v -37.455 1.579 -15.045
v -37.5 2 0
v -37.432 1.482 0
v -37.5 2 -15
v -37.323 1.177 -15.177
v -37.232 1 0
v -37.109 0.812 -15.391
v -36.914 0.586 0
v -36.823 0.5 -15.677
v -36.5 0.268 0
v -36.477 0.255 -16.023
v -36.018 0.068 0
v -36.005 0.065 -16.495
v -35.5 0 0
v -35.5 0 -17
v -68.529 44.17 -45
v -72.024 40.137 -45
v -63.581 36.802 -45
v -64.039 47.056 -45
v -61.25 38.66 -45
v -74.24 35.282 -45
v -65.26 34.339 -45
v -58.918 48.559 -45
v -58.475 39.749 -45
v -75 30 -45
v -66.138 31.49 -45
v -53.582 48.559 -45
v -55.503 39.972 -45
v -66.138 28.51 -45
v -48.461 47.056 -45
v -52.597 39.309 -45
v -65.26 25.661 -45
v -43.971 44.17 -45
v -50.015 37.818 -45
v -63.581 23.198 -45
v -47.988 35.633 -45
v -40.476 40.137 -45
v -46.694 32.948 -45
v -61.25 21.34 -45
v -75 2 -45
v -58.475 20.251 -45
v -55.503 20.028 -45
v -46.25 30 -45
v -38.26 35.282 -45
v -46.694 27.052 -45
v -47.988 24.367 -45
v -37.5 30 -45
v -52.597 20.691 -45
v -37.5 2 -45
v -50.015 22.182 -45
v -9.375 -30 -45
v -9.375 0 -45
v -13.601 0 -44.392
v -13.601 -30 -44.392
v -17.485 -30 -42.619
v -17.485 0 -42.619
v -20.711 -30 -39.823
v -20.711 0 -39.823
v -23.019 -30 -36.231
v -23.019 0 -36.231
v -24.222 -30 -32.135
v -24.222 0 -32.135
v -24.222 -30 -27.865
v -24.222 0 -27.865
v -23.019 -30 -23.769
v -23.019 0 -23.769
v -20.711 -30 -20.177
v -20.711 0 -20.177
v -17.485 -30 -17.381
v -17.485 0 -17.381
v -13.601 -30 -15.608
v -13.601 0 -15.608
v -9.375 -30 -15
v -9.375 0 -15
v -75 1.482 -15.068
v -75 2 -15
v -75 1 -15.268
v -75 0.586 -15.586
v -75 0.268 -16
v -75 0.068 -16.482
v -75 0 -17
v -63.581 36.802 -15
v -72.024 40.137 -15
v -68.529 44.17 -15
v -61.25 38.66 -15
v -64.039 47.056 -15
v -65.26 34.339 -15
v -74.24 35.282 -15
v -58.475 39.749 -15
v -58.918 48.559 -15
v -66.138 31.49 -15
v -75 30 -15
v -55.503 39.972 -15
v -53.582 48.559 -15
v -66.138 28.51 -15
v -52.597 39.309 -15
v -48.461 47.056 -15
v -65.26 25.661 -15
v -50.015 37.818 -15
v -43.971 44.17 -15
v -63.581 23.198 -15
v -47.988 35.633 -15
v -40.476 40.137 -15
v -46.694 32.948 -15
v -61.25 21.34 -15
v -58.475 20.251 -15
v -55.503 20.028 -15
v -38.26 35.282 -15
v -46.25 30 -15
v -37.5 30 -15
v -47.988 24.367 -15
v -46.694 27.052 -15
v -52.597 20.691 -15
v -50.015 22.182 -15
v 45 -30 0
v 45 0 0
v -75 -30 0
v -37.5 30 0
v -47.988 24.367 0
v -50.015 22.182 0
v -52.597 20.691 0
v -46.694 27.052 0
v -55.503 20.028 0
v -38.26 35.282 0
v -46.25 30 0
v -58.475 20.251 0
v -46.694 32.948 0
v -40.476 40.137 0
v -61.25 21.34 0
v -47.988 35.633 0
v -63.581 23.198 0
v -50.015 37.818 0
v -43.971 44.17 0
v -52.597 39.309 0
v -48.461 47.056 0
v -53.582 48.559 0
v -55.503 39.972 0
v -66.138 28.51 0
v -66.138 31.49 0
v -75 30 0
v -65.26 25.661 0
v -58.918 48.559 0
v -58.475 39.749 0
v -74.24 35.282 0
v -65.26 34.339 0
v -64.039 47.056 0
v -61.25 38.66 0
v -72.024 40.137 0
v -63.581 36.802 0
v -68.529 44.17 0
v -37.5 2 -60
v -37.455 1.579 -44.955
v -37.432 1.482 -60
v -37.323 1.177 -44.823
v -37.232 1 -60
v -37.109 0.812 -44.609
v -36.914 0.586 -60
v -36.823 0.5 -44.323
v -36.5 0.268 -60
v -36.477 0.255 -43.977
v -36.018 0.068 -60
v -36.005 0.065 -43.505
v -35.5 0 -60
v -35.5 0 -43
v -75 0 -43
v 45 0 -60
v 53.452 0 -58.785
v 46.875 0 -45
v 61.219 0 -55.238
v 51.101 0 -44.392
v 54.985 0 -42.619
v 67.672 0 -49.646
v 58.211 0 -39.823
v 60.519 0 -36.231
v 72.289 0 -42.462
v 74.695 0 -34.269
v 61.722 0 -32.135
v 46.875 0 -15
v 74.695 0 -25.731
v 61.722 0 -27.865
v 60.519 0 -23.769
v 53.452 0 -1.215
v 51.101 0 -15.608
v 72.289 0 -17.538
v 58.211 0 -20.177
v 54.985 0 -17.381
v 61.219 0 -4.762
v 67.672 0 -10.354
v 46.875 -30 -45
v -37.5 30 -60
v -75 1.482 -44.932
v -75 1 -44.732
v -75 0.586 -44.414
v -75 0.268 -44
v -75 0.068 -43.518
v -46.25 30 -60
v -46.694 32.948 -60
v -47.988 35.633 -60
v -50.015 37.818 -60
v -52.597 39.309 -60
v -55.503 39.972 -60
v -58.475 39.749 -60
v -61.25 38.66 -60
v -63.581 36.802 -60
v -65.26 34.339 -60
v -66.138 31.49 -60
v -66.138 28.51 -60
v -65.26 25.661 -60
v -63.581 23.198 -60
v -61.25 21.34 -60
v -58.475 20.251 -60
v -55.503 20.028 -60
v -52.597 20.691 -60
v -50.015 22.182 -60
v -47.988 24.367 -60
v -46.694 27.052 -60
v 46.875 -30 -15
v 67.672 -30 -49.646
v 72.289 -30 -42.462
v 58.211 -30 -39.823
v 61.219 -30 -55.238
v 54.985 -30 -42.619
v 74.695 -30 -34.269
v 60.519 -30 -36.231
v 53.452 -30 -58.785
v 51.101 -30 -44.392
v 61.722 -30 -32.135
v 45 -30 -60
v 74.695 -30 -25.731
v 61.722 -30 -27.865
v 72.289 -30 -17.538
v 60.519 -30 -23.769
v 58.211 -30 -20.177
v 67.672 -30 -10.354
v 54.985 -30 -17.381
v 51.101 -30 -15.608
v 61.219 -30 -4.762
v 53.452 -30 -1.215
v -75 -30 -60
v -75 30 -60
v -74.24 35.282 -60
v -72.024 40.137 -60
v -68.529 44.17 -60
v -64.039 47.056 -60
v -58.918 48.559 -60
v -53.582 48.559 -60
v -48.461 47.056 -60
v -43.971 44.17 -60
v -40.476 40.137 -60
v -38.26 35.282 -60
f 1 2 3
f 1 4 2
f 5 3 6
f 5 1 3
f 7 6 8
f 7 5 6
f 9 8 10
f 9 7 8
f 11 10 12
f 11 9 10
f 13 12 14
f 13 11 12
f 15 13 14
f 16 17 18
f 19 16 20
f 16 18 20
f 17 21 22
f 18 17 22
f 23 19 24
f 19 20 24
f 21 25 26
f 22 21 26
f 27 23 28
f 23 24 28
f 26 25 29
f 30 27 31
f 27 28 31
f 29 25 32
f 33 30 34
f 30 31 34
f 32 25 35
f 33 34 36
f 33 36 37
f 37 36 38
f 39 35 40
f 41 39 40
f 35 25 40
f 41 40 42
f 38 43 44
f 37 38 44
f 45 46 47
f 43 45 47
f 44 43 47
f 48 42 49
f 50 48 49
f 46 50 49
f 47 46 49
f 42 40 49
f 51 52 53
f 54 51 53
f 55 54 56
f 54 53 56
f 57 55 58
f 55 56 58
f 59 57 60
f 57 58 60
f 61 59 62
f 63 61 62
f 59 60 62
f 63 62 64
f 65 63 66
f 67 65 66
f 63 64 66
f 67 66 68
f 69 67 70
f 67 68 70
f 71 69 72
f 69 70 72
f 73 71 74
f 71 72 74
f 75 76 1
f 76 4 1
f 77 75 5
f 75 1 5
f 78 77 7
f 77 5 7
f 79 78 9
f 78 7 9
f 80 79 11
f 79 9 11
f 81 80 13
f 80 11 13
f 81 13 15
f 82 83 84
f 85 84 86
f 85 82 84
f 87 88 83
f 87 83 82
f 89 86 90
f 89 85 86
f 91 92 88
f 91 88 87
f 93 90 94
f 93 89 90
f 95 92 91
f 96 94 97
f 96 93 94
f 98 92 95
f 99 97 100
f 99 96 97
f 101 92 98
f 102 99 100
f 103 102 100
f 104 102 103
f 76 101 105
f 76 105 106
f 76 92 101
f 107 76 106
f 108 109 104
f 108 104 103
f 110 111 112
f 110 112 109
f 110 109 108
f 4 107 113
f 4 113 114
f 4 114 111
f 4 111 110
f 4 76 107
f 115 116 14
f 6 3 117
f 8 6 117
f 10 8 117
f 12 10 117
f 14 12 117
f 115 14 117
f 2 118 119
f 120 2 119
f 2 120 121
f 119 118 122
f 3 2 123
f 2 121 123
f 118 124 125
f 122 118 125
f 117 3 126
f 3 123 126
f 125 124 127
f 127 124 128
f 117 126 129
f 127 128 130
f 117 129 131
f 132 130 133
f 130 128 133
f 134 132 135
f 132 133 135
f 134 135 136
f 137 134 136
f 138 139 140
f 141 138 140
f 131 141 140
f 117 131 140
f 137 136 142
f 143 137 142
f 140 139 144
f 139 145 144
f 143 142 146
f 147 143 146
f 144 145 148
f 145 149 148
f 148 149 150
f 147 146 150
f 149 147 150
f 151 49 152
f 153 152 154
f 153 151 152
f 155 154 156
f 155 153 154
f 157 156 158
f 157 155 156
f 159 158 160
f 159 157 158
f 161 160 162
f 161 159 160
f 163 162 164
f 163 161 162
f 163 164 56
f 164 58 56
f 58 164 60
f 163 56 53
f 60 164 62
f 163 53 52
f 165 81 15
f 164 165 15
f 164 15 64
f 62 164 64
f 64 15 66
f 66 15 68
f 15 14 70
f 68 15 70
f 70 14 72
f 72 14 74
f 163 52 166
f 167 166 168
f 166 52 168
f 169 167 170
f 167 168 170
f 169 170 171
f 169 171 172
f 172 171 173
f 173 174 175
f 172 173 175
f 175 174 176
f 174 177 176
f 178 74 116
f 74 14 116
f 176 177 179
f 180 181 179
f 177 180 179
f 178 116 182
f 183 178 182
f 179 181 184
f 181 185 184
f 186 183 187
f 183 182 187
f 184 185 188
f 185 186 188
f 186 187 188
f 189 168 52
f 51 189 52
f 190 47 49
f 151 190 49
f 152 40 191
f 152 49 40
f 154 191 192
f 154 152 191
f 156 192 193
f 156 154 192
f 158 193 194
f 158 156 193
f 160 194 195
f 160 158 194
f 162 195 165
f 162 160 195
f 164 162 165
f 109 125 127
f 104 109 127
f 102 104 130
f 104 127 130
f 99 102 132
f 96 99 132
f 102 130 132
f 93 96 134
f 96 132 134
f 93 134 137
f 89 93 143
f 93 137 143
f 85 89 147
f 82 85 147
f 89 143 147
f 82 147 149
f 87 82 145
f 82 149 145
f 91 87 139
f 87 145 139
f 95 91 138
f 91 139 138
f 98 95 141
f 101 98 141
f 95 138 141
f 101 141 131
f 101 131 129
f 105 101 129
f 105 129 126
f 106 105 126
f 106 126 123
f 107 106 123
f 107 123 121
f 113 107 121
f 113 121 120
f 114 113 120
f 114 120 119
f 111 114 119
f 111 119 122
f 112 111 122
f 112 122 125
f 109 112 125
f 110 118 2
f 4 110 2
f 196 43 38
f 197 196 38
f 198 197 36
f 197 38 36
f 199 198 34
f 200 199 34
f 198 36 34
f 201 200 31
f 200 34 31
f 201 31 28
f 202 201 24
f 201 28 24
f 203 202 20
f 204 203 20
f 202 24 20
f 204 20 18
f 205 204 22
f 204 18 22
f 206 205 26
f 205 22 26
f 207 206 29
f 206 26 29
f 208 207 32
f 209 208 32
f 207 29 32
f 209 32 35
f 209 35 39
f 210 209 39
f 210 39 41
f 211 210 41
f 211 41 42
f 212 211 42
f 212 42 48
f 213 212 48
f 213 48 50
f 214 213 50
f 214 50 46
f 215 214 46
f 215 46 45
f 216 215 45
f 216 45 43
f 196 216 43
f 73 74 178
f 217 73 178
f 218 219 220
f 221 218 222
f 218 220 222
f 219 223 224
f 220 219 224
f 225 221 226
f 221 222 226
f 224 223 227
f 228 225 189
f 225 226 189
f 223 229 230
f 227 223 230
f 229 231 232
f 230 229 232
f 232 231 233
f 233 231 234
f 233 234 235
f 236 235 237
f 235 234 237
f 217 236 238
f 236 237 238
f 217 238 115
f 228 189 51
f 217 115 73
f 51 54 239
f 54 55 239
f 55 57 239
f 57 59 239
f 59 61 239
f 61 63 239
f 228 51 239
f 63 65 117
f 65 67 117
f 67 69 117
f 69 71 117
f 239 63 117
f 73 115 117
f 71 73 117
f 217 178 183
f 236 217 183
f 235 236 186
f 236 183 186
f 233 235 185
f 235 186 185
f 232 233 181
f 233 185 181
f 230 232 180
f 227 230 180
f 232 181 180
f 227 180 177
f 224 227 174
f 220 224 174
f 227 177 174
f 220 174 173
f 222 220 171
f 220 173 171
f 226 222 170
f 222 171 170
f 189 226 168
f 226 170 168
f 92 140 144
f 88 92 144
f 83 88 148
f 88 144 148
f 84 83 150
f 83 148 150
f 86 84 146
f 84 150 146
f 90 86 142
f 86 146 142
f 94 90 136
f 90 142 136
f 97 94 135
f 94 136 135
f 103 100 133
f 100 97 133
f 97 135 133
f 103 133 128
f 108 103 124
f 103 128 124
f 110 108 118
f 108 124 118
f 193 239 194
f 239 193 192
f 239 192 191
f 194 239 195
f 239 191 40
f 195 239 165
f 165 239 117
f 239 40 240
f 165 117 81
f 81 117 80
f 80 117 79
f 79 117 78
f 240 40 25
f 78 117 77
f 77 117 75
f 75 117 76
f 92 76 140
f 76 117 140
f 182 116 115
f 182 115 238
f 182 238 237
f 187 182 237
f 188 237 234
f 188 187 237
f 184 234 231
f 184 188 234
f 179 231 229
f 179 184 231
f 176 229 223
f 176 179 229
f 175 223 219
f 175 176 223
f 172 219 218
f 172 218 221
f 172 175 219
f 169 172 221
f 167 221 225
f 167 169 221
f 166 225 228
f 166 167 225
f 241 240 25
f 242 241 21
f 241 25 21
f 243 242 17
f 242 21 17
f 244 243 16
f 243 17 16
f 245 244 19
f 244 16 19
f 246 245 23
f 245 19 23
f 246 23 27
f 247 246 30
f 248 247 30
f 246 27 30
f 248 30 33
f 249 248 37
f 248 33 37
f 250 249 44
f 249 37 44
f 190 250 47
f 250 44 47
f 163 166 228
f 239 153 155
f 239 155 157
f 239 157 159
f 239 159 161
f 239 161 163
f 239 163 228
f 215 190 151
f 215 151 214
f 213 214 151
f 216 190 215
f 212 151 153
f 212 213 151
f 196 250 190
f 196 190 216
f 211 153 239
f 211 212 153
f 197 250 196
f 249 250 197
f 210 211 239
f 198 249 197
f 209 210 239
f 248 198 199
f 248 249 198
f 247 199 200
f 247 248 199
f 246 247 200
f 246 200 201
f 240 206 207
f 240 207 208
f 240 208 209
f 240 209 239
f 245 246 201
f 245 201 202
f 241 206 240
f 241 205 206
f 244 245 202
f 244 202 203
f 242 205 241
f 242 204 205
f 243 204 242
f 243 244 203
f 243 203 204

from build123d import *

# Parameters (mm, degrees)
SKETCH1_R           = 10
BOSS_EXTRUDE1_DEPTH = 60
SKETCH3_W           = 37.5
SKETCH3_H           = 30
CUT_EXTRUDE1_DEPTH  = 108.710549623
CUT_EXTRUDE2_DEPTH  = 108.710549623
FILLET1_RADIUS      = 30
FILLET1_LENGTH      = 30
FILLET2_R           = 2


with BuildPart() as part:
    # Sketch1 → Boss-Extrude1 (new body)
    with BuildSketch(Plane.XY):
        with BuildLine():
            Line((75, 0), (75, -30))
            Line((75, -30), (-75, -30))
            Line((-75, -30), (-75, 30))
            ThreePointArc((-75, 30), (-56.25, 48.75), (-37.5, 30))
            Line((-37.5, 30), (-37.5, 0))
            Line((-37.5, 0), (75, 0))
        make_face()
        with Locations((-56.25, 30)):
            Circle(SKETCH1_R, mode=Mode.SUBTRACT)
    extrude(amount=-BOSS_EXTRUDE1_DEPTH)

    # Sketch3 → Cut-Extrude1 (cut, through all)
    with BuildSketch(Plane(origin=(0, 0, 0), x_dir=(1, 0, 0), z_dir=(0, 1, 0))):
        with Locations((-56.25, 30)):
            Rectangle(SKETCH3_W, SKETCH3_H)
    extrude(amount=CUT_EXTRUDE1_DEPTH, mode=Mode.SUBTRACT)

    # Sketch3<5> → Cut-Extrude2 (cut, through all)
    with BuildSketch(Plane(origin=(0, 0, 0), x_dir=(1, 0, 0), z_dir=(0, 1, 0))):
        with BuildLine():
            Line((46.875, 45), (-9.375, 45))
            ThreePointArc((-9.375, 45), (-24.375, 30), (-9.375, 15))
            Line((-9.375, 15), (46.875, 15))
            ThreePointArc((46.875, 15), (61.875, 30), (46.875, 45))
        make_face()
    extrude(amount=-CUT_EXTRUDE2_DEPTH, mode=Mode.SUBTRACT)

    # Fillet1: full round fillet: the end face becomes a half cylinder, R = half its width
    fillet1_face = Plane((75, -15, -30), x_dir=(0, 1, 0), z_dir=(1, 0, 0))  # on the end face: x along it, z out of the body
    fillet1_slab = fillet1_face.offset(-FILLET1_RADIUS / 2) * Box(FILLET1_LENGTH, 2 * FILLET1_RADIUS, FILLET1_RADIUS, mode=Mode.PRIVATE)  # the body's end, R deep
    fillet1_round = Plane((45, -15, -30), x_dir=(1, 0, 0), z_dir=(0, 1, 0)) * Cylinder(FILLET1_RADIUS, FILLET1_LENGTH, mode=Mode.PRIVATE)  # its axis R under the face
    add(fillet1_slab - fillet1_round, mode=Mode.SUBTRACT)

    # Fillet2
    fillet2_edges = [part.edges().sort_by_distance(p)[0] for p in [
        (-37.5, 0, -52.5),
        (-37.5, 0, -7.5),
        (-56.25, 0, -45),
        (-56.25, 0, -15),
    ]]
    fillet(fillet2_edges, radius=FILLET2_R)


solid = part.part
